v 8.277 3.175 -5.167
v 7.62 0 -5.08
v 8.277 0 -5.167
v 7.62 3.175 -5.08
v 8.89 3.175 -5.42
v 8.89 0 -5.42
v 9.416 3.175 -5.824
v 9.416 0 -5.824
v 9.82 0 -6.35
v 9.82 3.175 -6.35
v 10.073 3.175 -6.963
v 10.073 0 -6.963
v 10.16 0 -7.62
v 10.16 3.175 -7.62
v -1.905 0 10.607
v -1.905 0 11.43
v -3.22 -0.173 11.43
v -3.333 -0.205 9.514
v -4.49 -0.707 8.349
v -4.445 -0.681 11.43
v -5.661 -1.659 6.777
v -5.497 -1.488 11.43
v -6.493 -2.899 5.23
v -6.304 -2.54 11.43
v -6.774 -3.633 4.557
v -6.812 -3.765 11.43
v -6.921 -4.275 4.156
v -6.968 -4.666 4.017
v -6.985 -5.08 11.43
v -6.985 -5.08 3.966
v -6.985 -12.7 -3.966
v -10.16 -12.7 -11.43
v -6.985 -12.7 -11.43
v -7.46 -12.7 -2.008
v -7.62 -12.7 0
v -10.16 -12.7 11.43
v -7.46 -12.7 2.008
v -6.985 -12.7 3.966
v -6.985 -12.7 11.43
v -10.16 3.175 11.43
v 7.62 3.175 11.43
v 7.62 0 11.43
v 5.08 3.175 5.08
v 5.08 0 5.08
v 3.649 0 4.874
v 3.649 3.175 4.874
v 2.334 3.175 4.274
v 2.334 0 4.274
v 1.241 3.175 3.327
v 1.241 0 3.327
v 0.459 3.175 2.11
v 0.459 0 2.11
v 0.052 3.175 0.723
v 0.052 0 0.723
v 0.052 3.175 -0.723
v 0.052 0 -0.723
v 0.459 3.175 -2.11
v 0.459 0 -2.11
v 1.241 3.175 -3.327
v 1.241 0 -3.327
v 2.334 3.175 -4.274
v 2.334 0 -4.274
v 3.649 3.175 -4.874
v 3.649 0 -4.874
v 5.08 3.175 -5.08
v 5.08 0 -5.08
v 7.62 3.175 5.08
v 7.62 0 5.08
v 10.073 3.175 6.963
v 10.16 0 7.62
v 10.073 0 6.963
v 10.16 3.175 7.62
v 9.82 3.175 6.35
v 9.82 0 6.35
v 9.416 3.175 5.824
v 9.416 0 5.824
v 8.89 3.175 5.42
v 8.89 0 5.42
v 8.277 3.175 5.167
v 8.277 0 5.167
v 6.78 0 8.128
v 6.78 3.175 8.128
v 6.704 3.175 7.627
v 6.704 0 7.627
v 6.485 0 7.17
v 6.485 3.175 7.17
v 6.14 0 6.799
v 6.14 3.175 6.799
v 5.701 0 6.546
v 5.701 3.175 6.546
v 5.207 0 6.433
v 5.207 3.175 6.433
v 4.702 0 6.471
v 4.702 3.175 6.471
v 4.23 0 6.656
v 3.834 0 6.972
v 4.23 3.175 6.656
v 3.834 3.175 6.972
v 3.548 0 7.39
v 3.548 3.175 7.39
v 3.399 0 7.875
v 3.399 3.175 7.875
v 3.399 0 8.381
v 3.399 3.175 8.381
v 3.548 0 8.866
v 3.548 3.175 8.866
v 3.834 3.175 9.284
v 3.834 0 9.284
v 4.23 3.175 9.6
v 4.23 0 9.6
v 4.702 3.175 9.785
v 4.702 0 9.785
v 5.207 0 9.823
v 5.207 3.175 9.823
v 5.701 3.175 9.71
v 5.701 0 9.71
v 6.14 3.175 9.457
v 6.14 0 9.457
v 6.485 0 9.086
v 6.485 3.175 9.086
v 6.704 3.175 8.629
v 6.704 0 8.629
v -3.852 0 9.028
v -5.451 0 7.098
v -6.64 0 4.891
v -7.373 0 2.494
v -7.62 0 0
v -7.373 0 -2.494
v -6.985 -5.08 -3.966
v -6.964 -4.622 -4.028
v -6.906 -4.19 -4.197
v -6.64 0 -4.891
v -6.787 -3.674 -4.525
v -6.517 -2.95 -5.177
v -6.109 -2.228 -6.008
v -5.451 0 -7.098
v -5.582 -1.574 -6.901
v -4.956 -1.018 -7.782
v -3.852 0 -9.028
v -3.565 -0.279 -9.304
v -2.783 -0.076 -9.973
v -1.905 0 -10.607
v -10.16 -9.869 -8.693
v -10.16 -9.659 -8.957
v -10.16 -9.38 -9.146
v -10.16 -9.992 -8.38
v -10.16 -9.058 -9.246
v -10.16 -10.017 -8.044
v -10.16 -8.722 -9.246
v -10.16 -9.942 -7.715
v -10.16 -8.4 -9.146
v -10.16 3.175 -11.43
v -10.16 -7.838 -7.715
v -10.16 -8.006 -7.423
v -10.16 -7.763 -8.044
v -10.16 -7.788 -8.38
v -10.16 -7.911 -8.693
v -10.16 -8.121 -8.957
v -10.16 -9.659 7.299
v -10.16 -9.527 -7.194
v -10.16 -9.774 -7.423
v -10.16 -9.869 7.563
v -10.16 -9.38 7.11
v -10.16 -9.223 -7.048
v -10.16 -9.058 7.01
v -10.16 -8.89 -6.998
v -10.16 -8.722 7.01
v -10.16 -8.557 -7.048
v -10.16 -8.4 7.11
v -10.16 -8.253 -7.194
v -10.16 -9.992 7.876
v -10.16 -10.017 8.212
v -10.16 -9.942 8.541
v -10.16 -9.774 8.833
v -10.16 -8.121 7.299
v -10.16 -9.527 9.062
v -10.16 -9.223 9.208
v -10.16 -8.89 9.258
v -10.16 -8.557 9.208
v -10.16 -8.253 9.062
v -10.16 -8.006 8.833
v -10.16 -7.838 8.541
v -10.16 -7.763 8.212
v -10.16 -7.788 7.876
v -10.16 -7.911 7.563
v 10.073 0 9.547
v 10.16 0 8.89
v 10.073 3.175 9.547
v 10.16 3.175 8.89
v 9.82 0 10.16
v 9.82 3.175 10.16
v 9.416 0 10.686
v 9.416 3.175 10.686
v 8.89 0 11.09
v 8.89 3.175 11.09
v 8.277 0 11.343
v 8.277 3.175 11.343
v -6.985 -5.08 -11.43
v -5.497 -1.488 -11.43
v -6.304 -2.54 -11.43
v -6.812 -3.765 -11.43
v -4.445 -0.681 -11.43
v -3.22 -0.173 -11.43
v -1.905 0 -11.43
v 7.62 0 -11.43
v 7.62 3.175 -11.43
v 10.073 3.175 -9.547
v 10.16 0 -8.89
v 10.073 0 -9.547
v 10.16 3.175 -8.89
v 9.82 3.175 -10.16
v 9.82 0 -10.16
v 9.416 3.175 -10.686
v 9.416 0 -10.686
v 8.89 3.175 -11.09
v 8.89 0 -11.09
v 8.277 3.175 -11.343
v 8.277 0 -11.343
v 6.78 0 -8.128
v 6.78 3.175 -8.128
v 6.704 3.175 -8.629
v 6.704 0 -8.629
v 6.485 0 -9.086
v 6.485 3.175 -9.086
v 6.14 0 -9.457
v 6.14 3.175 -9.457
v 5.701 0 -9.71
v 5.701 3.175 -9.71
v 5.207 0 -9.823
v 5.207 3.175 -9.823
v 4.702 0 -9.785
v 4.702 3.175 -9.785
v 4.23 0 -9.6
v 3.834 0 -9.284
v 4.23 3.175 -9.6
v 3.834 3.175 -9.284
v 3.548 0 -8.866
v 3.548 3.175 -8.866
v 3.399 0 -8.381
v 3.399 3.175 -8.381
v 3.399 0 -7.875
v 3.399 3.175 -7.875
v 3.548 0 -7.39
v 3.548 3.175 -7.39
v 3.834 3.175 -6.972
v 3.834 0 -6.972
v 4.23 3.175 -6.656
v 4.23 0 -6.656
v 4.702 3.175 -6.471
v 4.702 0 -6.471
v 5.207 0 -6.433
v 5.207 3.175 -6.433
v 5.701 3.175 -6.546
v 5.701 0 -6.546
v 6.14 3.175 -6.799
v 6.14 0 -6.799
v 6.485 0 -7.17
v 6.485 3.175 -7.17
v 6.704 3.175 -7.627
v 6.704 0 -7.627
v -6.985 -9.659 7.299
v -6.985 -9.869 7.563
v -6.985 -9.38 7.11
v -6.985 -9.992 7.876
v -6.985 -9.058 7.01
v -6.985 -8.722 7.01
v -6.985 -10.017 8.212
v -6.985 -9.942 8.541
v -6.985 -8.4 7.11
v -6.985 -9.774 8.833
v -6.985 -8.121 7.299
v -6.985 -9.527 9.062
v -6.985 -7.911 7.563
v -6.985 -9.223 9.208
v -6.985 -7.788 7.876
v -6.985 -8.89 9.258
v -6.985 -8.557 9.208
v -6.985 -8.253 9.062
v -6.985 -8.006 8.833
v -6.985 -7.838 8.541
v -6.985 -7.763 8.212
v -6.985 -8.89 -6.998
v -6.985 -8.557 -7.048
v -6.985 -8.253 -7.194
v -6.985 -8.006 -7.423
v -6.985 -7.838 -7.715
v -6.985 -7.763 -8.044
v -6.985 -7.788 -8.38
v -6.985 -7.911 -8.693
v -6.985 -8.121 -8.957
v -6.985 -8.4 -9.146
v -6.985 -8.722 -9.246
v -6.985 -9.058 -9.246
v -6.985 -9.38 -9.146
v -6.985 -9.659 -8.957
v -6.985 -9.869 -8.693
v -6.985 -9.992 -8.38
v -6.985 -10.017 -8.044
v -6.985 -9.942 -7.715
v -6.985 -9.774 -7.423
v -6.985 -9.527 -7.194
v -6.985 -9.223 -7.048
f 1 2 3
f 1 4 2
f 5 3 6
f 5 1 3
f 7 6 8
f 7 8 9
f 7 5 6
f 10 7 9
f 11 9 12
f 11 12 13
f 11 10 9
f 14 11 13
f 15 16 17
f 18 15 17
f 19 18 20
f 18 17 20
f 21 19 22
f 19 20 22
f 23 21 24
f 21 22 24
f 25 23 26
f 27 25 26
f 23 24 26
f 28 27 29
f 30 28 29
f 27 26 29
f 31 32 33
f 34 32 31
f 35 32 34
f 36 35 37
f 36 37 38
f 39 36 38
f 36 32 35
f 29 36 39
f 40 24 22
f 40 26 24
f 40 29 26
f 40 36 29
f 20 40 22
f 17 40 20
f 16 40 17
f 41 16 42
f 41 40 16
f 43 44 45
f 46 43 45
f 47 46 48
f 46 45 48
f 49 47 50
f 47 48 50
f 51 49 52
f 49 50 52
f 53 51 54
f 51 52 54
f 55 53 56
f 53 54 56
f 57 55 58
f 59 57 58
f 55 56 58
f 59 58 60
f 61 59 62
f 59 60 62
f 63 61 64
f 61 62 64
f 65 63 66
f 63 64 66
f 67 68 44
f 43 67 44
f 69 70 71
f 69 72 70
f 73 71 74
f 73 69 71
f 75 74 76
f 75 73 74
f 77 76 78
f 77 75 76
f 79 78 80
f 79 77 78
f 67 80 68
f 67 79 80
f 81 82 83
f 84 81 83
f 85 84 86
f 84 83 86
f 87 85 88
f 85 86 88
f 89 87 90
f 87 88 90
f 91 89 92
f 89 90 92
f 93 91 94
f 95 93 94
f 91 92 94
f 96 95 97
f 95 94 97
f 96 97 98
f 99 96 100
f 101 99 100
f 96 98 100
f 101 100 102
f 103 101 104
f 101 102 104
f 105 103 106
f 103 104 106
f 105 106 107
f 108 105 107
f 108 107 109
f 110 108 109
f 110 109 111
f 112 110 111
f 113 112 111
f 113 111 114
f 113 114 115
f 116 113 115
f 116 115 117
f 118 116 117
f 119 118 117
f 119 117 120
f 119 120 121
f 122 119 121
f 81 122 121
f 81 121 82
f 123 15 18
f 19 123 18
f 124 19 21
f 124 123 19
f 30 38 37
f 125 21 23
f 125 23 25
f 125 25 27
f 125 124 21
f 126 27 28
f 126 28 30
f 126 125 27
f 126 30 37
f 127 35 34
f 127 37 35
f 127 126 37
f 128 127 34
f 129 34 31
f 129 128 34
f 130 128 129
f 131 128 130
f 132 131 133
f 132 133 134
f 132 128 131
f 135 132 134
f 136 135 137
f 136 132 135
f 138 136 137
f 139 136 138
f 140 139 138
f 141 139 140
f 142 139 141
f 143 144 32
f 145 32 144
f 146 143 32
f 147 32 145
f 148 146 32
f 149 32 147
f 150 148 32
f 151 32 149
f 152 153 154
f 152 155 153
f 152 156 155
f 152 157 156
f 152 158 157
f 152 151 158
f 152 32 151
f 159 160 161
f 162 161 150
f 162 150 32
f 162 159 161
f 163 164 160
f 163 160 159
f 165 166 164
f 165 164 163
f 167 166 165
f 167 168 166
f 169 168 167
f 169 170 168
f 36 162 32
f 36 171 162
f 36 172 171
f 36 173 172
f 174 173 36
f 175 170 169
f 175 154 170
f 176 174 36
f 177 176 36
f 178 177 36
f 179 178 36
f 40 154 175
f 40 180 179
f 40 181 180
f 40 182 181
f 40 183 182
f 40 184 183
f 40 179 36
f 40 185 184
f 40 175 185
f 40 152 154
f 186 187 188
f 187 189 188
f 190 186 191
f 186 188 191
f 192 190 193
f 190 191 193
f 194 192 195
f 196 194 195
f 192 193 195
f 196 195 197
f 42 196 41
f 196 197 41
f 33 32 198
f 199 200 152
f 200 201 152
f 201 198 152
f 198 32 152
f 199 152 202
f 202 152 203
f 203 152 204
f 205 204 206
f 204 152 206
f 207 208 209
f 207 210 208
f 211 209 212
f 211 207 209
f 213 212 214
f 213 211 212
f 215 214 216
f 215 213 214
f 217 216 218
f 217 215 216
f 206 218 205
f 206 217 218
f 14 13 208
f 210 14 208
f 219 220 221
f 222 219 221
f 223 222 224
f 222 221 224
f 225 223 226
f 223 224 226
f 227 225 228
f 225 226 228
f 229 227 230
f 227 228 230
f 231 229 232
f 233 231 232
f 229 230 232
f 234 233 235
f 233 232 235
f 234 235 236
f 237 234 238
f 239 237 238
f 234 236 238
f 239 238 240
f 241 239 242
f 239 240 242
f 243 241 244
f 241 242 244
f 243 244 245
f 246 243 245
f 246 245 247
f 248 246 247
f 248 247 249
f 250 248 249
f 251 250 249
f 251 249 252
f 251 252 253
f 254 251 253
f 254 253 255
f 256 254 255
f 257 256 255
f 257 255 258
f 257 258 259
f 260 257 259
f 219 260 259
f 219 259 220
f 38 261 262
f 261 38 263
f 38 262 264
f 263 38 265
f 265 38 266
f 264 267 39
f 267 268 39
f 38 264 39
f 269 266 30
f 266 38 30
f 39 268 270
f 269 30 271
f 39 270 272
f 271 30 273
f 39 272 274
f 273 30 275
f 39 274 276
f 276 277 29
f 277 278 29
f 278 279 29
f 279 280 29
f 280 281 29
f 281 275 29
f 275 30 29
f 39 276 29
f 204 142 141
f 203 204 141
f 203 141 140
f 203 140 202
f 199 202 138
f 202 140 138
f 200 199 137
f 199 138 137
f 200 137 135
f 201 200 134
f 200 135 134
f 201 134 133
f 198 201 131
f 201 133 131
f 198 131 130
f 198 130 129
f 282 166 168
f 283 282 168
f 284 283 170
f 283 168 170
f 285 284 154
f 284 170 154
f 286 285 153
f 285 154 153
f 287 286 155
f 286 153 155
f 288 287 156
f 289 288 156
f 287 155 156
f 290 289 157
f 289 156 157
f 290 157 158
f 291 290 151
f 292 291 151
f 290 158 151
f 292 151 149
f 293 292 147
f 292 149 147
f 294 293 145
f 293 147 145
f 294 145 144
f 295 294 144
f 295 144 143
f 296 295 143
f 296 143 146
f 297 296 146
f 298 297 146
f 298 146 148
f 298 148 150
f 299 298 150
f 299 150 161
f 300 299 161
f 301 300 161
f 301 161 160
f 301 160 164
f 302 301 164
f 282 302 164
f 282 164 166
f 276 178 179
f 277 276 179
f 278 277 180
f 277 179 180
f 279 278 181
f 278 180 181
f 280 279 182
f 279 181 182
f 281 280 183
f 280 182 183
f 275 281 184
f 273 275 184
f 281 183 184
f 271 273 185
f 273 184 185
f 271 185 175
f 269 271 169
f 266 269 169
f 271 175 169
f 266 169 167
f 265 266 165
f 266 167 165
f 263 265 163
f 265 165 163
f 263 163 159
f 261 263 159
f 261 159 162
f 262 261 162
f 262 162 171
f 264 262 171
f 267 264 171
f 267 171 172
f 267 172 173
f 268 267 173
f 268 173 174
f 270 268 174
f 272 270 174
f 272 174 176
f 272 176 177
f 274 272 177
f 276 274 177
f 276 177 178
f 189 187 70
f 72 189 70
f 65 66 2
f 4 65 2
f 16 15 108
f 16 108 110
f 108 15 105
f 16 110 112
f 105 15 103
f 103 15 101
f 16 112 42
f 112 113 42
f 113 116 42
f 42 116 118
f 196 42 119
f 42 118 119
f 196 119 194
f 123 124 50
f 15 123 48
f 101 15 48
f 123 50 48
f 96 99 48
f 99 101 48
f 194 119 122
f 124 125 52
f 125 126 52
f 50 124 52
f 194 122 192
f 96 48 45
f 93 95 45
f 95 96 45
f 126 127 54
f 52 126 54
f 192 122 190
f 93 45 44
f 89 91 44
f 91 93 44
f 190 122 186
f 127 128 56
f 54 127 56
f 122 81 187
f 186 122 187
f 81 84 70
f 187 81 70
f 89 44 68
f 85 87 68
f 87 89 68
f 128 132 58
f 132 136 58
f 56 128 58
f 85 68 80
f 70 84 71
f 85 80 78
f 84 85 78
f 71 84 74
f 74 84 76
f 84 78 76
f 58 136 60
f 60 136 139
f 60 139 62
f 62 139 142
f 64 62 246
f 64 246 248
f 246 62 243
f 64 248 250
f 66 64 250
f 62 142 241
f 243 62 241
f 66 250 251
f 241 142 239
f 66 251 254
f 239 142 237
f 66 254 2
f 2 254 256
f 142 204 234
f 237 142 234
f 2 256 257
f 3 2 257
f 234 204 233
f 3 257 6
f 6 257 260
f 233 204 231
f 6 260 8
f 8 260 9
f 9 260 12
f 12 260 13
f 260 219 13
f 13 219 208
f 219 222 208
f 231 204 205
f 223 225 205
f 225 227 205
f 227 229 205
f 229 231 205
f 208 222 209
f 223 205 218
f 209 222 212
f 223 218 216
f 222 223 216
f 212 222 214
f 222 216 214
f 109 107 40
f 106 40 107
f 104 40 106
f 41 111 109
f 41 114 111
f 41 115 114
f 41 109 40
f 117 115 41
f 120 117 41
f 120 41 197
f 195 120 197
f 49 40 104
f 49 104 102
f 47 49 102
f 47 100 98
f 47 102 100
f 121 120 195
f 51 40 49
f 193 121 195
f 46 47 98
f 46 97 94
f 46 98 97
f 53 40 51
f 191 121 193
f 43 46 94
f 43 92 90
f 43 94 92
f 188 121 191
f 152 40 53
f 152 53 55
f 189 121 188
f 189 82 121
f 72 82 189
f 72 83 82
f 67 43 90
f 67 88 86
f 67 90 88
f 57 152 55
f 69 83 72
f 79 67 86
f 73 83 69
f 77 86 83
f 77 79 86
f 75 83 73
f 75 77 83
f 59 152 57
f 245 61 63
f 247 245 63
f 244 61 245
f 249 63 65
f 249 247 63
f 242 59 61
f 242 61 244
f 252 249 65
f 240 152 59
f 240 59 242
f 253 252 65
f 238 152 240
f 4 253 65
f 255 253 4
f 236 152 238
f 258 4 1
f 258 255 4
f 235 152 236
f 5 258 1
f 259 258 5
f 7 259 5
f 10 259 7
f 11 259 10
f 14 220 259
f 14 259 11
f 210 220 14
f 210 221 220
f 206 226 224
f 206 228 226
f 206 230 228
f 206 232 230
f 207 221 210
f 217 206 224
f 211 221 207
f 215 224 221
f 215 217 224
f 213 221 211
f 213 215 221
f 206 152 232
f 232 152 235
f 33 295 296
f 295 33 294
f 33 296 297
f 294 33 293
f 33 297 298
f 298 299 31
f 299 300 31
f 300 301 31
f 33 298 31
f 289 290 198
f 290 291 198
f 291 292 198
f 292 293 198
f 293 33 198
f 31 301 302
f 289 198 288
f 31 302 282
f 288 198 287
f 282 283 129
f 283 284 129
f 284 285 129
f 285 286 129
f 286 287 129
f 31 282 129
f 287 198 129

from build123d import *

# Parameters (mm, degrees)
SKETCH1_W             = 20.32
SKETCH1_H             = 22.86
BOSS_EXTRUDE1_DEPTH   = 3.175
FILLET1_R             = 2.54
FILLET2_R             = 2.54
CUT_EXTRUDE2_DEPTH    = 4.175
FILLET3_R             = 2.54
FILLET4_R             = 2.54
SKETCH4_W             = 3.175
SKETCH4_H             = 22.86
BOSS_EXTRUDE2_DEPTH   = 12.7
FILLET6_R             = 5.08
SKETCH5_R             = 12.7
CUT_EXTRUDE4_DEPTH    = 13.7
F_4_40_TAPPED_HOLE3_D = 2.2606
M3_CLEARANCE_HOLE1_D  = 3.4


with BuildPart() as part:
    # Sketch1 → Boss-Extrude1 (new body)
    with BuildSketch(Plane(origin=(0, 0, 0), x_dir=(1, 0, 0), z_dir=(0, 1, 0))):
        Rectangle(SKETCH1_W, SKETCH1_H)
    extrude(amount=BOSS_EXTRUDE1_DEPTH)

    # Fillet1
    fillet1_edges = [part.edges().sort_by_distance(p)[0] for p in [
        (10.16, 1.5875, -11.43),
    ]]
    fillet(fillet1_edges, radius=FILLET1_R)

    # Fillet2
    fillet2_edges = [part.edges().sort_by_distance(p)[0] for p in [
        (10.16, 1.5875, 11.43),
    ]]
    fillet(fillet2_edges, radius=FILLET2_R)

    # Sketch2 → Cut-Extrude2 (cut, through all)
    with BuildSketch(Plane.XZ):
        with BuildLine():
            Line((5.08, -5.08), (10.16, -5.08))
            Line((10.16, -5.08), (10.16, 5.08))
            Line((10.16, 5.08), (5.08, 5.08))
            ThreePointArc((5.08, 5.08), (0, 0), (5.08, -5.08))
        make_face()
    extrude(amount=-CUT_EXTRUDE2_DEPTH, mode=Mode.SUBTRACT)

    # Fillet3
    fillet3_edges = [part.edges().sort_by_distance(p)[0] for p in [
        (10.16, 1.5875, 5.08),
    ]]
    fillet(fillet3_edges, radius=FILLET3_R)

    # Fillet4
    fillet4_edges = [part.edges().sort_by_distance(p)[0] for p in [
        (10.16, 1.5875, -5.08),
    ]]
    fillet(fillet4_edges, radius=FILLET4_R)

    # Sketch4 → Boss-Extrude2 (add)
    with BuildSketch(Plane.XZ):
        with Locations((-8.5725, 0)):
            Rectangle(SKETCH4_W, SKETCH4_H)
    extrude(amount=BOSS_EXTRUDE2_DEPTH)

    # Fillet6
    fillet6_edges = [part.edges().sort_by_distance(p)[0] for p in [
        (-6.985, 0, 0),
    ]]
    fillet(fillet6_edges, radius=FILLET6_R)

    # Sketch5 → Cut-Extrude4 (cut, through all)
    with BuildSketch(Plane.XZ):
        with Locations((5.08, 0)):
            Circle(SKETCH5_R)
    extrude(amount=CUT_EXTRUDE4_DEPTH, mode=Mode.SUBTRACT)

    # #4-40 Tapped Hole3 (through all)
    with Locations(Plane(origin=(-6.985, 0, 0), x_dir=(0, 0, -1), z_dir=(1, 0, 0))):
        with Locations((-8.128, -8.89), (8.128, -8.89)):
            Hole(F_4_40_TAPPED_HOLE3_D / 2)

    # M3 Clearance Hole1 (through all)
    with Locations(Plane(origin=(0, 0, 0), x_dir=(-1, 0, 0), z_dir=(0, -1, 0))):
        with Locations((-5.08, -8.128), (-5.08, 8.128)):
            Hole(M3_CLEARANCE_HOLE1_D / 2)


solid = part.part
